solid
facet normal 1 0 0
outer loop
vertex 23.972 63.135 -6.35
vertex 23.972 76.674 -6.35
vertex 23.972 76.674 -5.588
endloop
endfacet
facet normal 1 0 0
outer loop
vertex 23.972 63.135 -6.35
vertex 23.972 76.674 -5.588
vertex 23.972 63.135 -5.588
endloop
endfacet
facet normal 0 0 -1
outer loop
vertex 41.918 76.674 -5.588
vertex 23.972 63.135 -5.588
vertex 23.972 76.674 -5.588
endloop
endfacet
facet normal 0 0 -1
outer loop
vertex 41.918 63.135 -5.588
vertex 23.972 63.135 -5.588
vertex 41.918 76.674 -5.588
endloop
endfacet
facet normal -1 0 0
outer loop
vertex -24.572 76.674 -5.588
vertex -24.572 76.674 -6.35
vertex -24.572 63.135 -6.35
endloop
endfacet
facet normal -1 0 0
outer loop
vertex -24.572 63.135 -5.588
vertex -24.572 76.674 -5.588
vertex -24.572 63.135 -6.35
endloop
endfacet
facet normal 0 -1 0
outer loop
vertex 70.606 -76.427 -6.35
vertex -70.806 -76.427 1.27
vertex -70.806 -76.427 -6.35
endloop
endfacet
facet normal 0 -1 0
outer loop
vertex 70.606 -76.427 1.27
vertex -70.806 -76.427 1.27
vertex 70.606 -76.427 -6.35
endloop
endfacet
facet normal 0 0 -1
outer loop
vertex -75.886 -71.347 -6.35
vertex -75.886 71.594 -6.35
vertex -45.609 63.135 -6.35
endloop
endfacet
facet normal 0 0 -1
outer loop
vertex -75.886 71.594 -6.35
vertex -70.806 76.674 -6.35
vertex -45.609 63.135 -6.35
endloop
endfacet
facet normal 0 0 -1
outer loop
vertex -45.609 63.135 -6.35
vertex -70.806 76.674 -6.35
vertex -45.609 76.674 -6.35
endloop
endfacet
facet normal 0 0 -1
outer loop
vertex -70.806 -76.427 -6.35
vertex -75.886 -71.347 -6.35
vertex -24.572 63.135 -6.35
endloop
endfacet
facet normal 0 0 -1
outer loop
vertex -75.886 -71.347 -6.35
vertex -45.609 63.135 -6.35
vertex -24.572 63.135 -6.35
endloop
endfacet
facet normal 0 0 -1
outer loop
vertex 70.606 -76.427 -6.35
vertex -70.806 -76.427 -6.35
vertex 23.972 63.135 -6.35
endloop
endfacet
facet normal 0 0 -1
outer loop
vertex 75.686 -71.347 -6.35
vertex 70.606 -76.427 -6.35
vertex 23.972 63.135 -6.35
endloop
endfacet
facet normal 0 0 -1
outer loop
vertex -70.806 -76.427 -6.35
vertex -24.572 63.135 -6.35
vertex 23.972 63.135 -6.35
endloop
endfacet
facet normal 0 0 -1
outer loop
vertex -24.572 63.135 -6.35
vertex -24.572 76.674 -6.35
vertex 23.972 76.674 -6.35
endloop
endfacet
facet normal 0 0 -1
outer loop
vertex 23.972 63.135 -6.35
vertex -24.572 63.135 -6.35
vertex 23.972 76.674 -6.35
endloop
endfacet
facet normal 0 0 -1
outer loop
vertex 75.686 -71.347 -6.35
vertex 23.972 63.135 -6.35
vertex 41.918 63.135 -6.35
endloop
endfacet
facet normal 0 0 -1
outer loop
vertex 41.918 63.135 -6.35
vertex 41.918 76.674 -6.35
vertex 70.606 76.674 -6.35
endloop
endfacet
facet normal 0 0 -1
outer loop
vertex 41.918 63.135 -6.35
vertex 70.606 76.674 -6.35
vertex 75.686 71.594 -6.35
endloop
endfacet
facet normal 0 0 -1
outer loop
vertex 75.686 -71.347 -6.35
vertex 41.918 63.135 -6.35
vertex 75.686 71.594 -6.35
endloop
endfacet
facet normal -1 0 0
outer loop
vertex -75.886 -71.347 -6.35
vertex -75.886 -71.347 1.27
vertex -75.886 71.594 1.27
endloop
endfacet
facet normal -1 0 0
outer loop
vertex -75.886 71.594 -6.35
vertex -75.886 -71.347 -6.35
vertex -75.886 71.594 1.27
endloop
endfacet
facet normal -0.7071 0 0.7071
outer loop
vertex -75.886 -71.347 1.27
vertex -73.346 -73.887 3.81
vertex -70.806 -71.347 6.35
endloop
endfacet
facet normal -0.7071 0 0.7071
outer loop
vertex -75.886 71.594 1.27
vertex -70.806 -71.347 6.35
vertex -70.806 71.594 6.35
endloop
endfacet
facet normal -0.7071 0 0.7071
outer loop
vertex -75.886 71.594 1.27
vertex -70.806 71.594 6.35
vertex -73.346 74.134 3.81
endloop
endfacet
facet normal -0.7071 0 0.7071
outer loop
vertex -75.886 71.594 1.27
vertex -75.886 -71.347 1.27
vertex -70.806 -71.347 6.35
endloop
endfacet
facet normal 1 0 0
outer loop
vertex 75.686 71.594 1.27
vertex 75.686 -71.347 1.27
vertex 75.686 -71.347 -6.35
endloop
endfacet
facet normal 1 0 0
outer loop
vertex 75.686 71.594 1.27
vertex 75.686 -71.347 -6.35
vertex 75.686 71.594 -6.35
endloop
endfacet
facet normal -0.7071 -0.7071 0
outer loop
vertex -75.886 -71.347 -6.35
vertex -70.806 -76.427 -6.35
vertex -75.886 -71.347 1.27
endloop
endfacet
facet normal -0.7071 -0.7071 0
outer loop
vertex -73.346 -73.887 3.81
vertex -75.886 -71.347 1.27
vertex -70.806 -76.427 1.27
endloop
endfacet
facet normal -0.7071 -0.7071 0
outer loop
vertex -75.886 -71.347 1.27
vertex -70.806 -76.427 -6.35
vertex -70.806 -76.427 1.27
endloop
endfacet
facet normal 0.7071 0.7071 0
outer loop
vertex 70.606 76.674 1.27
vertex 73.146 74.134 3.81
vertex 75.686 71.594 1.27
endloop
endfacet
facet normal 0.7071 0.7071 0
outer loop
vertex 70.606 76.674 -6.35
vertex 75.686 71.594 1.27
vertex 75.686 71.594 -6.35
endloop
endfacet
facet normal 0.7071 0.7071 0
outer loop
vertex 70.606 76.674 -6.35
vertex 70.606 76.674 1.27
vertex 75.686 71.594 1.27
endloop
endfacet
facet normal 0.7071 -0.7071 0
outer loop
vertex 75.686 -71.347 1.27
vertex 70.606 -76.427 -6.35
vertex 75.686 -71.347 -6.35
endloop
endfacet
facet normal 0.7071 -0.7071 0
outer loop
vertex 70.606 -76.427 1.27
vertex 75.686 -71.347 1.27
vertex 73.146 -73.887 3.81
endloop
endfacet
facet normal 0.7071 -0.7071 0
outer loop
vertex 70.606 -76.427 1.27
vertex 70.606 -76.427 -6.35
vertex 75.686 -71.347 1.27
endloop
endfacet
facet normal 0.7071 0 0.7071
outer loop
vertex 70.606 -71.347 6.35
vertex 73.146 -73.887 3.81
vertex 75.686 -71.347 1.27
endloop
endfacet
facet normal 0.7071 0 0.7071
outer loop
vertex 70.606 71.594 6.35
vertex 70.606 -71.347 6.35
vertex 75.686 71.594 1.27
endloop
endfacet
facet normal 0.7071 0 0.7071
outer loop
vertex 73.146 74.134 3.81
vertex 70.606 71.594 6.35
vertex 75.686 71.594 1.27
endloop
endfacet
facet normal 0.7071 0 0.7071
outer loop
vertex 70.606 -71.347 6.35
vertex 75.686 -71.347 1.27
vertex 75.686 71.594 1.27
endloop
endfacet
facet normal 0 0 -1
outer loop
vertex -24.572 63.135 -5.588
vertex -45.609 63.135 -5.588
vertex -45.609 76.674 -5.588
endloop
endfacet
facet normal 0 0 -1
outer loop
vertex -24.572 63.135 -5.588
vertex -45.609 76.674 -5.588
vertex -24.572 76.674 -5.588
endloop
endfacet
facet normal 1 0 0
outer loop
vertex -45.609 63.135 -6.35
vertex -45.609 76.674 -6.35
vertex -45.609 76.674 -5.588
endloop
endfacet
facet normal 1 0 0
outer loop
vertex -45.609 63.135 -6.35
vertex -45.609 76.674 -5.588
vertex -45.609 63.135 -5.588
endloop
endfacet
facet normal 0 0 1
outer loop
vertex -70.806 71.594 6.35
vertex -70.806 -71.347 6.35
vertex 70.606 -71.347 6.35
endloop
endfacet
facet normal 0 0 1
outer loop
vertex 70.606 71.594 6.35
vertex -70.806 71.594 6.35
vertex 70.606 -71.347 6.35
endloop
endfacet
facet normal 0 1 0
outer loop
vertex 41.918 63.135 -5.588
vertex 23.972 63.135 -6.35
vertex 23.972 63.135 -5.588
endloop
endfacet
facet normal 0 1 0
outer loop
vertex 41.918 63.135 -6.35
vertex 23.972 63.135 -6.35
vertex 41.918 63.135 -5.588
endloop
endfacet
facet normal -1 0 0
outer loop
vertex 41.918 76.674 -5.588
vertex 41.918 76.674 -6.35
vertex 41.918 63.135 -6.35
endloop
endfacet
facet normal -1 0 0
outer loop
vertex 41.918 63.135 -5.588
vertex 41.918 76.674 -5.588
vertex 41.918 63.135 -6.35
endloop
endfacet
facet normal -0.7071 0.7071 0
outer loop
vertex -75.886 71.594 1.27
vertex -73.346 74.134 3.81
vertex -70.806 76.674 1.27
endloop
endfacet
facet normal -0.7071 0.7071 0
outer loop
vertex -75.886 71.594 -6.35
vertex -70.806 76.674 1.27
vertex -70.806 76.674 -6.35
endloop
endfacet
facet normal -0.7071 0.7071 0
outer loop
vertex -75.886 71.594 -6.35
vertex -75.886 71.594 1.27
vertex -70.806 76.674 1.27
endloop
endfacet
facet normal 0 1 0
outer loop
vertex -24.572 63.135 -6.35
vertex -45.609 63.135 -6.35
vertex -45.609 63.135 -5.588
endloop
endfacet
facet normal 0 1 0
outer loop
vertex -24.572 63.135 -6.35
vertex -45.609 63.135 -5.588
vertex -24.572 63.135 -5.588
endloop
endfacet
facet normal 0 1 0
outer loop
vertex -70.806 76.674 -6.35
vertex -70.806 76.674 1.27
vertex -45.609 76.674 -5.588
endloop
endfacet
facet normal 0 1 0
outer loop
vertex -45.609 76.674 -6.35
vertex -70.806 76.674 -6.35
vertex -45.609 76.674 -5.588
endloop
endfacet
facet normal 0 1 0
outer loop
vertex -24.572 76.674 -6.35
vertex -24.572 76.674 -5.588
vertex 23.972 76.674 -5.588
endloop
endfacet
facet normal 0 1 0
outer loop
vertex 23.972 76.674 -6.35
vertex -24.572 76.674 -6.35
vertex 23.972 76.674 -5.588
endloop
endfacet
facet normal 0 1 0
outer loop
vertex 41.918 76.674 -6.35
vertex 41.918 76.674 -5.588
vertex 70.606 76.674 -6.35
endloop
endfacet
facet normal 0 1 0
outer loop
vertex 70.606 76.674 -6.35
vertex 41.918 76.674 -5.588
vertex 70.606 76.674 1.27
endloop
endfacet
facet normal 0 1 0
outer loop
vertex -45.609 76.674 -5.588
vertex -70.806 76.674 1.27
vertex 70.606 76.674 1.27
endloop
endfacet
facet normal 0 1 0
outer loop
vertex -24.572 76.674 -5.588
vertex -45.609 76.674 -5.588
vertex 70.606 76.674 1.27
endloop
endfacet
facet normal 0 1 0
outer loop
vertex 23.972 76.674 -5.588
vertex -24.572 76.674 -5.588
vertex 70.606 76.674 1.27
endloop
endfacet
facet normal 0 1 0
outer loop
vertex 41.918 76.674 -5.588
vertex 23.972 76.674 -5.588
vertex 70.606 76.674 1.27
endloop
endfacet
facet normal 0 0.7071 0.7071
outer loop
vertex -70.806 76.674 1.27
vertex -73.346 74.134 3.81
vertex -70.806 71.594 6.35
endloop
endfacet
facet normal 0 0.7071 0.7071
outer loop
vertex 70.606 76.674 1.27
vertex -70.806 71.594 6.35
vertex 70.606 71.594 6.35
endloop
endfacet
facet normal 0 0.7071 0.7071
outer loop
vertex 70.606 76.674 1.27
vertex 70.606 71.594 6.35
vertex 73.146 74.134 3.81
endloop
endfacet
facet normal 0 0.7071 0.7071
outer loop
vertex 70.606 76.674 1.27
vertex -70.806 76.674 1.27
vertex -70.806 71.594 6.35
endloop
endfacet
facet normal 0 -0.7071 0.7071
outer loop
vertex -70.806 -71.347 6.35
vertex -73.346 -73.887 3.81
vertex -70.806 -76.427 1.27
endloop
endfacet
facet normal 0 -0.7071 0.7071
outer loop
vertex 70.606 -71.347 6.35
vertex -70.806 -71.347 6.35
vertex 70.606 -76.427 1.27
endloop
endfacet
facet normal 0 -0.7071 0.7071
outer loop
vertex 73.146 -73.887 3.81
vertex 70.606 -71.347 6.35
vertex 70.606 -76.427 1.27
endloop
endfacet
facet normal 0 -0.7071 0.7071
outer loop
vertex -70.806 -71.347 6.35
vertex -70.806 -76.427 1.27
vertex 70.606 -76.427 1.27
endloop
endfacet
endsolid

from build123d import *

# Parameters (mm, degrees)
F0_W     = 151.572406292
F0_H     = 153.1009078026
F1_DEPTH = 6.35
F2_SIZE  = 5.08
F3_SIZE  = 5.08
F4_SIZE  = 5.08
F5_SIZE  = 5.08
F6_W     = 17.9464835674
F6_H     = 13.5393217206
F7_DEPTH = 0.762
F8_W     = 21.0372619331
F8_H     = 13.5393217206
F9_DEPTH = 0.762
F10_SIZE = 5.08
F11_SIZE = 5.08
F12_SIZE = 5.08
F13_SIZE = 5.08


with BuildPart() as f1:
    # F0 (on Top) → F1 (new body, symmetric)
    with BuildSketch(Plane.XY):
        with Locations((-0.1000165939, 0.1238584518)):
            Rectangle(F0_W, F0_H)
    extrude(amount=F1_DEPTH, both=True)

    # F2
    f2_edges = [f1.edges().sort_by_distance(p)[0] for p in [
        (-0.100017, -76.426595, 6.35),
    ]]
    chamfer(f2_edges, length=F2_SIZE)

    # F3
    f3_edges = [f1.edges().sort_by_distance(p)[0] for p in [
        (-0.100017, 76.674312, 6.35),
    ]]
    chamfer(f3_edges, length=F3_SIZE)

    # F4
    f4_edges = [f1.edges().sort_by_distance(p)[0] for p in [
        (75.686187, 0.123858, 6.35),
    ]]
    chamfer(f4_edges, length=F4_SIZE)

    # F5
    f5_edges = [f1.edges().sort_by_distance(p)[0] for p in [
        (-75.88622, 0.123858, 6.35),
    ]]
    chamfer(f5_edges, length=F5_SIZE)

    # F6 (on face) → F7 (cut)
    with BuildSketch(Plane(origin=(0, 0, -6.35), x_dir=(1, 0, 0), z_dir=(0, 0, -1))):
        with Locations((32.9451402649, -69.9046514928)):
            Rectangle(F6_W, F6_H)
    extrude(amount=-F7_DEPTH, mode=Mode.SUBTRACT)

    # F8 (on face) → F9 (cut)
    with BuildSketch(Plane(origin=(0, 0, -6.35), x_dir=(1, 0, 0), z_dir=(0, 0, -1))):
        with Locations((-35.0907575339, -69.9046514928)):
            Rectangle(F8_W, F8_H)
    extrude(amount=-F9_DEPTH, mode=Mode.SUBTRACT)

    # F10
    f10_edges = [f1.edges().sort_by_distance(p)[0] for p in [
        (75.686187, -76.426595, -2.54),
    ]]
    chamfer(f10_edges, length=F10_SIZE)

    # F11
    f11_edges = [f1.edges().sort_by_distance(p)[0] for p in [
        (75.686187, 76.674312, -2.54),
    ]]
    chamfer(f11_edges, length=F11_SIZE)

    # F12
    f12_edges = [f1.edges().sort_by_distance(p)[0] for p in [
        (-75.88622, 76.674312, -2.54),
    ]]
    chamfer(f12_edges, length=F12_SIZE)

    # F13
    f13_edges = [f1.edges().sort_by_distance(p)[0] for p in [
        (-75.88622, -76.426595, -2.54),
    ]]
    chamfer(f13_edges, length=F13_SIZE)


solid = f1.part
